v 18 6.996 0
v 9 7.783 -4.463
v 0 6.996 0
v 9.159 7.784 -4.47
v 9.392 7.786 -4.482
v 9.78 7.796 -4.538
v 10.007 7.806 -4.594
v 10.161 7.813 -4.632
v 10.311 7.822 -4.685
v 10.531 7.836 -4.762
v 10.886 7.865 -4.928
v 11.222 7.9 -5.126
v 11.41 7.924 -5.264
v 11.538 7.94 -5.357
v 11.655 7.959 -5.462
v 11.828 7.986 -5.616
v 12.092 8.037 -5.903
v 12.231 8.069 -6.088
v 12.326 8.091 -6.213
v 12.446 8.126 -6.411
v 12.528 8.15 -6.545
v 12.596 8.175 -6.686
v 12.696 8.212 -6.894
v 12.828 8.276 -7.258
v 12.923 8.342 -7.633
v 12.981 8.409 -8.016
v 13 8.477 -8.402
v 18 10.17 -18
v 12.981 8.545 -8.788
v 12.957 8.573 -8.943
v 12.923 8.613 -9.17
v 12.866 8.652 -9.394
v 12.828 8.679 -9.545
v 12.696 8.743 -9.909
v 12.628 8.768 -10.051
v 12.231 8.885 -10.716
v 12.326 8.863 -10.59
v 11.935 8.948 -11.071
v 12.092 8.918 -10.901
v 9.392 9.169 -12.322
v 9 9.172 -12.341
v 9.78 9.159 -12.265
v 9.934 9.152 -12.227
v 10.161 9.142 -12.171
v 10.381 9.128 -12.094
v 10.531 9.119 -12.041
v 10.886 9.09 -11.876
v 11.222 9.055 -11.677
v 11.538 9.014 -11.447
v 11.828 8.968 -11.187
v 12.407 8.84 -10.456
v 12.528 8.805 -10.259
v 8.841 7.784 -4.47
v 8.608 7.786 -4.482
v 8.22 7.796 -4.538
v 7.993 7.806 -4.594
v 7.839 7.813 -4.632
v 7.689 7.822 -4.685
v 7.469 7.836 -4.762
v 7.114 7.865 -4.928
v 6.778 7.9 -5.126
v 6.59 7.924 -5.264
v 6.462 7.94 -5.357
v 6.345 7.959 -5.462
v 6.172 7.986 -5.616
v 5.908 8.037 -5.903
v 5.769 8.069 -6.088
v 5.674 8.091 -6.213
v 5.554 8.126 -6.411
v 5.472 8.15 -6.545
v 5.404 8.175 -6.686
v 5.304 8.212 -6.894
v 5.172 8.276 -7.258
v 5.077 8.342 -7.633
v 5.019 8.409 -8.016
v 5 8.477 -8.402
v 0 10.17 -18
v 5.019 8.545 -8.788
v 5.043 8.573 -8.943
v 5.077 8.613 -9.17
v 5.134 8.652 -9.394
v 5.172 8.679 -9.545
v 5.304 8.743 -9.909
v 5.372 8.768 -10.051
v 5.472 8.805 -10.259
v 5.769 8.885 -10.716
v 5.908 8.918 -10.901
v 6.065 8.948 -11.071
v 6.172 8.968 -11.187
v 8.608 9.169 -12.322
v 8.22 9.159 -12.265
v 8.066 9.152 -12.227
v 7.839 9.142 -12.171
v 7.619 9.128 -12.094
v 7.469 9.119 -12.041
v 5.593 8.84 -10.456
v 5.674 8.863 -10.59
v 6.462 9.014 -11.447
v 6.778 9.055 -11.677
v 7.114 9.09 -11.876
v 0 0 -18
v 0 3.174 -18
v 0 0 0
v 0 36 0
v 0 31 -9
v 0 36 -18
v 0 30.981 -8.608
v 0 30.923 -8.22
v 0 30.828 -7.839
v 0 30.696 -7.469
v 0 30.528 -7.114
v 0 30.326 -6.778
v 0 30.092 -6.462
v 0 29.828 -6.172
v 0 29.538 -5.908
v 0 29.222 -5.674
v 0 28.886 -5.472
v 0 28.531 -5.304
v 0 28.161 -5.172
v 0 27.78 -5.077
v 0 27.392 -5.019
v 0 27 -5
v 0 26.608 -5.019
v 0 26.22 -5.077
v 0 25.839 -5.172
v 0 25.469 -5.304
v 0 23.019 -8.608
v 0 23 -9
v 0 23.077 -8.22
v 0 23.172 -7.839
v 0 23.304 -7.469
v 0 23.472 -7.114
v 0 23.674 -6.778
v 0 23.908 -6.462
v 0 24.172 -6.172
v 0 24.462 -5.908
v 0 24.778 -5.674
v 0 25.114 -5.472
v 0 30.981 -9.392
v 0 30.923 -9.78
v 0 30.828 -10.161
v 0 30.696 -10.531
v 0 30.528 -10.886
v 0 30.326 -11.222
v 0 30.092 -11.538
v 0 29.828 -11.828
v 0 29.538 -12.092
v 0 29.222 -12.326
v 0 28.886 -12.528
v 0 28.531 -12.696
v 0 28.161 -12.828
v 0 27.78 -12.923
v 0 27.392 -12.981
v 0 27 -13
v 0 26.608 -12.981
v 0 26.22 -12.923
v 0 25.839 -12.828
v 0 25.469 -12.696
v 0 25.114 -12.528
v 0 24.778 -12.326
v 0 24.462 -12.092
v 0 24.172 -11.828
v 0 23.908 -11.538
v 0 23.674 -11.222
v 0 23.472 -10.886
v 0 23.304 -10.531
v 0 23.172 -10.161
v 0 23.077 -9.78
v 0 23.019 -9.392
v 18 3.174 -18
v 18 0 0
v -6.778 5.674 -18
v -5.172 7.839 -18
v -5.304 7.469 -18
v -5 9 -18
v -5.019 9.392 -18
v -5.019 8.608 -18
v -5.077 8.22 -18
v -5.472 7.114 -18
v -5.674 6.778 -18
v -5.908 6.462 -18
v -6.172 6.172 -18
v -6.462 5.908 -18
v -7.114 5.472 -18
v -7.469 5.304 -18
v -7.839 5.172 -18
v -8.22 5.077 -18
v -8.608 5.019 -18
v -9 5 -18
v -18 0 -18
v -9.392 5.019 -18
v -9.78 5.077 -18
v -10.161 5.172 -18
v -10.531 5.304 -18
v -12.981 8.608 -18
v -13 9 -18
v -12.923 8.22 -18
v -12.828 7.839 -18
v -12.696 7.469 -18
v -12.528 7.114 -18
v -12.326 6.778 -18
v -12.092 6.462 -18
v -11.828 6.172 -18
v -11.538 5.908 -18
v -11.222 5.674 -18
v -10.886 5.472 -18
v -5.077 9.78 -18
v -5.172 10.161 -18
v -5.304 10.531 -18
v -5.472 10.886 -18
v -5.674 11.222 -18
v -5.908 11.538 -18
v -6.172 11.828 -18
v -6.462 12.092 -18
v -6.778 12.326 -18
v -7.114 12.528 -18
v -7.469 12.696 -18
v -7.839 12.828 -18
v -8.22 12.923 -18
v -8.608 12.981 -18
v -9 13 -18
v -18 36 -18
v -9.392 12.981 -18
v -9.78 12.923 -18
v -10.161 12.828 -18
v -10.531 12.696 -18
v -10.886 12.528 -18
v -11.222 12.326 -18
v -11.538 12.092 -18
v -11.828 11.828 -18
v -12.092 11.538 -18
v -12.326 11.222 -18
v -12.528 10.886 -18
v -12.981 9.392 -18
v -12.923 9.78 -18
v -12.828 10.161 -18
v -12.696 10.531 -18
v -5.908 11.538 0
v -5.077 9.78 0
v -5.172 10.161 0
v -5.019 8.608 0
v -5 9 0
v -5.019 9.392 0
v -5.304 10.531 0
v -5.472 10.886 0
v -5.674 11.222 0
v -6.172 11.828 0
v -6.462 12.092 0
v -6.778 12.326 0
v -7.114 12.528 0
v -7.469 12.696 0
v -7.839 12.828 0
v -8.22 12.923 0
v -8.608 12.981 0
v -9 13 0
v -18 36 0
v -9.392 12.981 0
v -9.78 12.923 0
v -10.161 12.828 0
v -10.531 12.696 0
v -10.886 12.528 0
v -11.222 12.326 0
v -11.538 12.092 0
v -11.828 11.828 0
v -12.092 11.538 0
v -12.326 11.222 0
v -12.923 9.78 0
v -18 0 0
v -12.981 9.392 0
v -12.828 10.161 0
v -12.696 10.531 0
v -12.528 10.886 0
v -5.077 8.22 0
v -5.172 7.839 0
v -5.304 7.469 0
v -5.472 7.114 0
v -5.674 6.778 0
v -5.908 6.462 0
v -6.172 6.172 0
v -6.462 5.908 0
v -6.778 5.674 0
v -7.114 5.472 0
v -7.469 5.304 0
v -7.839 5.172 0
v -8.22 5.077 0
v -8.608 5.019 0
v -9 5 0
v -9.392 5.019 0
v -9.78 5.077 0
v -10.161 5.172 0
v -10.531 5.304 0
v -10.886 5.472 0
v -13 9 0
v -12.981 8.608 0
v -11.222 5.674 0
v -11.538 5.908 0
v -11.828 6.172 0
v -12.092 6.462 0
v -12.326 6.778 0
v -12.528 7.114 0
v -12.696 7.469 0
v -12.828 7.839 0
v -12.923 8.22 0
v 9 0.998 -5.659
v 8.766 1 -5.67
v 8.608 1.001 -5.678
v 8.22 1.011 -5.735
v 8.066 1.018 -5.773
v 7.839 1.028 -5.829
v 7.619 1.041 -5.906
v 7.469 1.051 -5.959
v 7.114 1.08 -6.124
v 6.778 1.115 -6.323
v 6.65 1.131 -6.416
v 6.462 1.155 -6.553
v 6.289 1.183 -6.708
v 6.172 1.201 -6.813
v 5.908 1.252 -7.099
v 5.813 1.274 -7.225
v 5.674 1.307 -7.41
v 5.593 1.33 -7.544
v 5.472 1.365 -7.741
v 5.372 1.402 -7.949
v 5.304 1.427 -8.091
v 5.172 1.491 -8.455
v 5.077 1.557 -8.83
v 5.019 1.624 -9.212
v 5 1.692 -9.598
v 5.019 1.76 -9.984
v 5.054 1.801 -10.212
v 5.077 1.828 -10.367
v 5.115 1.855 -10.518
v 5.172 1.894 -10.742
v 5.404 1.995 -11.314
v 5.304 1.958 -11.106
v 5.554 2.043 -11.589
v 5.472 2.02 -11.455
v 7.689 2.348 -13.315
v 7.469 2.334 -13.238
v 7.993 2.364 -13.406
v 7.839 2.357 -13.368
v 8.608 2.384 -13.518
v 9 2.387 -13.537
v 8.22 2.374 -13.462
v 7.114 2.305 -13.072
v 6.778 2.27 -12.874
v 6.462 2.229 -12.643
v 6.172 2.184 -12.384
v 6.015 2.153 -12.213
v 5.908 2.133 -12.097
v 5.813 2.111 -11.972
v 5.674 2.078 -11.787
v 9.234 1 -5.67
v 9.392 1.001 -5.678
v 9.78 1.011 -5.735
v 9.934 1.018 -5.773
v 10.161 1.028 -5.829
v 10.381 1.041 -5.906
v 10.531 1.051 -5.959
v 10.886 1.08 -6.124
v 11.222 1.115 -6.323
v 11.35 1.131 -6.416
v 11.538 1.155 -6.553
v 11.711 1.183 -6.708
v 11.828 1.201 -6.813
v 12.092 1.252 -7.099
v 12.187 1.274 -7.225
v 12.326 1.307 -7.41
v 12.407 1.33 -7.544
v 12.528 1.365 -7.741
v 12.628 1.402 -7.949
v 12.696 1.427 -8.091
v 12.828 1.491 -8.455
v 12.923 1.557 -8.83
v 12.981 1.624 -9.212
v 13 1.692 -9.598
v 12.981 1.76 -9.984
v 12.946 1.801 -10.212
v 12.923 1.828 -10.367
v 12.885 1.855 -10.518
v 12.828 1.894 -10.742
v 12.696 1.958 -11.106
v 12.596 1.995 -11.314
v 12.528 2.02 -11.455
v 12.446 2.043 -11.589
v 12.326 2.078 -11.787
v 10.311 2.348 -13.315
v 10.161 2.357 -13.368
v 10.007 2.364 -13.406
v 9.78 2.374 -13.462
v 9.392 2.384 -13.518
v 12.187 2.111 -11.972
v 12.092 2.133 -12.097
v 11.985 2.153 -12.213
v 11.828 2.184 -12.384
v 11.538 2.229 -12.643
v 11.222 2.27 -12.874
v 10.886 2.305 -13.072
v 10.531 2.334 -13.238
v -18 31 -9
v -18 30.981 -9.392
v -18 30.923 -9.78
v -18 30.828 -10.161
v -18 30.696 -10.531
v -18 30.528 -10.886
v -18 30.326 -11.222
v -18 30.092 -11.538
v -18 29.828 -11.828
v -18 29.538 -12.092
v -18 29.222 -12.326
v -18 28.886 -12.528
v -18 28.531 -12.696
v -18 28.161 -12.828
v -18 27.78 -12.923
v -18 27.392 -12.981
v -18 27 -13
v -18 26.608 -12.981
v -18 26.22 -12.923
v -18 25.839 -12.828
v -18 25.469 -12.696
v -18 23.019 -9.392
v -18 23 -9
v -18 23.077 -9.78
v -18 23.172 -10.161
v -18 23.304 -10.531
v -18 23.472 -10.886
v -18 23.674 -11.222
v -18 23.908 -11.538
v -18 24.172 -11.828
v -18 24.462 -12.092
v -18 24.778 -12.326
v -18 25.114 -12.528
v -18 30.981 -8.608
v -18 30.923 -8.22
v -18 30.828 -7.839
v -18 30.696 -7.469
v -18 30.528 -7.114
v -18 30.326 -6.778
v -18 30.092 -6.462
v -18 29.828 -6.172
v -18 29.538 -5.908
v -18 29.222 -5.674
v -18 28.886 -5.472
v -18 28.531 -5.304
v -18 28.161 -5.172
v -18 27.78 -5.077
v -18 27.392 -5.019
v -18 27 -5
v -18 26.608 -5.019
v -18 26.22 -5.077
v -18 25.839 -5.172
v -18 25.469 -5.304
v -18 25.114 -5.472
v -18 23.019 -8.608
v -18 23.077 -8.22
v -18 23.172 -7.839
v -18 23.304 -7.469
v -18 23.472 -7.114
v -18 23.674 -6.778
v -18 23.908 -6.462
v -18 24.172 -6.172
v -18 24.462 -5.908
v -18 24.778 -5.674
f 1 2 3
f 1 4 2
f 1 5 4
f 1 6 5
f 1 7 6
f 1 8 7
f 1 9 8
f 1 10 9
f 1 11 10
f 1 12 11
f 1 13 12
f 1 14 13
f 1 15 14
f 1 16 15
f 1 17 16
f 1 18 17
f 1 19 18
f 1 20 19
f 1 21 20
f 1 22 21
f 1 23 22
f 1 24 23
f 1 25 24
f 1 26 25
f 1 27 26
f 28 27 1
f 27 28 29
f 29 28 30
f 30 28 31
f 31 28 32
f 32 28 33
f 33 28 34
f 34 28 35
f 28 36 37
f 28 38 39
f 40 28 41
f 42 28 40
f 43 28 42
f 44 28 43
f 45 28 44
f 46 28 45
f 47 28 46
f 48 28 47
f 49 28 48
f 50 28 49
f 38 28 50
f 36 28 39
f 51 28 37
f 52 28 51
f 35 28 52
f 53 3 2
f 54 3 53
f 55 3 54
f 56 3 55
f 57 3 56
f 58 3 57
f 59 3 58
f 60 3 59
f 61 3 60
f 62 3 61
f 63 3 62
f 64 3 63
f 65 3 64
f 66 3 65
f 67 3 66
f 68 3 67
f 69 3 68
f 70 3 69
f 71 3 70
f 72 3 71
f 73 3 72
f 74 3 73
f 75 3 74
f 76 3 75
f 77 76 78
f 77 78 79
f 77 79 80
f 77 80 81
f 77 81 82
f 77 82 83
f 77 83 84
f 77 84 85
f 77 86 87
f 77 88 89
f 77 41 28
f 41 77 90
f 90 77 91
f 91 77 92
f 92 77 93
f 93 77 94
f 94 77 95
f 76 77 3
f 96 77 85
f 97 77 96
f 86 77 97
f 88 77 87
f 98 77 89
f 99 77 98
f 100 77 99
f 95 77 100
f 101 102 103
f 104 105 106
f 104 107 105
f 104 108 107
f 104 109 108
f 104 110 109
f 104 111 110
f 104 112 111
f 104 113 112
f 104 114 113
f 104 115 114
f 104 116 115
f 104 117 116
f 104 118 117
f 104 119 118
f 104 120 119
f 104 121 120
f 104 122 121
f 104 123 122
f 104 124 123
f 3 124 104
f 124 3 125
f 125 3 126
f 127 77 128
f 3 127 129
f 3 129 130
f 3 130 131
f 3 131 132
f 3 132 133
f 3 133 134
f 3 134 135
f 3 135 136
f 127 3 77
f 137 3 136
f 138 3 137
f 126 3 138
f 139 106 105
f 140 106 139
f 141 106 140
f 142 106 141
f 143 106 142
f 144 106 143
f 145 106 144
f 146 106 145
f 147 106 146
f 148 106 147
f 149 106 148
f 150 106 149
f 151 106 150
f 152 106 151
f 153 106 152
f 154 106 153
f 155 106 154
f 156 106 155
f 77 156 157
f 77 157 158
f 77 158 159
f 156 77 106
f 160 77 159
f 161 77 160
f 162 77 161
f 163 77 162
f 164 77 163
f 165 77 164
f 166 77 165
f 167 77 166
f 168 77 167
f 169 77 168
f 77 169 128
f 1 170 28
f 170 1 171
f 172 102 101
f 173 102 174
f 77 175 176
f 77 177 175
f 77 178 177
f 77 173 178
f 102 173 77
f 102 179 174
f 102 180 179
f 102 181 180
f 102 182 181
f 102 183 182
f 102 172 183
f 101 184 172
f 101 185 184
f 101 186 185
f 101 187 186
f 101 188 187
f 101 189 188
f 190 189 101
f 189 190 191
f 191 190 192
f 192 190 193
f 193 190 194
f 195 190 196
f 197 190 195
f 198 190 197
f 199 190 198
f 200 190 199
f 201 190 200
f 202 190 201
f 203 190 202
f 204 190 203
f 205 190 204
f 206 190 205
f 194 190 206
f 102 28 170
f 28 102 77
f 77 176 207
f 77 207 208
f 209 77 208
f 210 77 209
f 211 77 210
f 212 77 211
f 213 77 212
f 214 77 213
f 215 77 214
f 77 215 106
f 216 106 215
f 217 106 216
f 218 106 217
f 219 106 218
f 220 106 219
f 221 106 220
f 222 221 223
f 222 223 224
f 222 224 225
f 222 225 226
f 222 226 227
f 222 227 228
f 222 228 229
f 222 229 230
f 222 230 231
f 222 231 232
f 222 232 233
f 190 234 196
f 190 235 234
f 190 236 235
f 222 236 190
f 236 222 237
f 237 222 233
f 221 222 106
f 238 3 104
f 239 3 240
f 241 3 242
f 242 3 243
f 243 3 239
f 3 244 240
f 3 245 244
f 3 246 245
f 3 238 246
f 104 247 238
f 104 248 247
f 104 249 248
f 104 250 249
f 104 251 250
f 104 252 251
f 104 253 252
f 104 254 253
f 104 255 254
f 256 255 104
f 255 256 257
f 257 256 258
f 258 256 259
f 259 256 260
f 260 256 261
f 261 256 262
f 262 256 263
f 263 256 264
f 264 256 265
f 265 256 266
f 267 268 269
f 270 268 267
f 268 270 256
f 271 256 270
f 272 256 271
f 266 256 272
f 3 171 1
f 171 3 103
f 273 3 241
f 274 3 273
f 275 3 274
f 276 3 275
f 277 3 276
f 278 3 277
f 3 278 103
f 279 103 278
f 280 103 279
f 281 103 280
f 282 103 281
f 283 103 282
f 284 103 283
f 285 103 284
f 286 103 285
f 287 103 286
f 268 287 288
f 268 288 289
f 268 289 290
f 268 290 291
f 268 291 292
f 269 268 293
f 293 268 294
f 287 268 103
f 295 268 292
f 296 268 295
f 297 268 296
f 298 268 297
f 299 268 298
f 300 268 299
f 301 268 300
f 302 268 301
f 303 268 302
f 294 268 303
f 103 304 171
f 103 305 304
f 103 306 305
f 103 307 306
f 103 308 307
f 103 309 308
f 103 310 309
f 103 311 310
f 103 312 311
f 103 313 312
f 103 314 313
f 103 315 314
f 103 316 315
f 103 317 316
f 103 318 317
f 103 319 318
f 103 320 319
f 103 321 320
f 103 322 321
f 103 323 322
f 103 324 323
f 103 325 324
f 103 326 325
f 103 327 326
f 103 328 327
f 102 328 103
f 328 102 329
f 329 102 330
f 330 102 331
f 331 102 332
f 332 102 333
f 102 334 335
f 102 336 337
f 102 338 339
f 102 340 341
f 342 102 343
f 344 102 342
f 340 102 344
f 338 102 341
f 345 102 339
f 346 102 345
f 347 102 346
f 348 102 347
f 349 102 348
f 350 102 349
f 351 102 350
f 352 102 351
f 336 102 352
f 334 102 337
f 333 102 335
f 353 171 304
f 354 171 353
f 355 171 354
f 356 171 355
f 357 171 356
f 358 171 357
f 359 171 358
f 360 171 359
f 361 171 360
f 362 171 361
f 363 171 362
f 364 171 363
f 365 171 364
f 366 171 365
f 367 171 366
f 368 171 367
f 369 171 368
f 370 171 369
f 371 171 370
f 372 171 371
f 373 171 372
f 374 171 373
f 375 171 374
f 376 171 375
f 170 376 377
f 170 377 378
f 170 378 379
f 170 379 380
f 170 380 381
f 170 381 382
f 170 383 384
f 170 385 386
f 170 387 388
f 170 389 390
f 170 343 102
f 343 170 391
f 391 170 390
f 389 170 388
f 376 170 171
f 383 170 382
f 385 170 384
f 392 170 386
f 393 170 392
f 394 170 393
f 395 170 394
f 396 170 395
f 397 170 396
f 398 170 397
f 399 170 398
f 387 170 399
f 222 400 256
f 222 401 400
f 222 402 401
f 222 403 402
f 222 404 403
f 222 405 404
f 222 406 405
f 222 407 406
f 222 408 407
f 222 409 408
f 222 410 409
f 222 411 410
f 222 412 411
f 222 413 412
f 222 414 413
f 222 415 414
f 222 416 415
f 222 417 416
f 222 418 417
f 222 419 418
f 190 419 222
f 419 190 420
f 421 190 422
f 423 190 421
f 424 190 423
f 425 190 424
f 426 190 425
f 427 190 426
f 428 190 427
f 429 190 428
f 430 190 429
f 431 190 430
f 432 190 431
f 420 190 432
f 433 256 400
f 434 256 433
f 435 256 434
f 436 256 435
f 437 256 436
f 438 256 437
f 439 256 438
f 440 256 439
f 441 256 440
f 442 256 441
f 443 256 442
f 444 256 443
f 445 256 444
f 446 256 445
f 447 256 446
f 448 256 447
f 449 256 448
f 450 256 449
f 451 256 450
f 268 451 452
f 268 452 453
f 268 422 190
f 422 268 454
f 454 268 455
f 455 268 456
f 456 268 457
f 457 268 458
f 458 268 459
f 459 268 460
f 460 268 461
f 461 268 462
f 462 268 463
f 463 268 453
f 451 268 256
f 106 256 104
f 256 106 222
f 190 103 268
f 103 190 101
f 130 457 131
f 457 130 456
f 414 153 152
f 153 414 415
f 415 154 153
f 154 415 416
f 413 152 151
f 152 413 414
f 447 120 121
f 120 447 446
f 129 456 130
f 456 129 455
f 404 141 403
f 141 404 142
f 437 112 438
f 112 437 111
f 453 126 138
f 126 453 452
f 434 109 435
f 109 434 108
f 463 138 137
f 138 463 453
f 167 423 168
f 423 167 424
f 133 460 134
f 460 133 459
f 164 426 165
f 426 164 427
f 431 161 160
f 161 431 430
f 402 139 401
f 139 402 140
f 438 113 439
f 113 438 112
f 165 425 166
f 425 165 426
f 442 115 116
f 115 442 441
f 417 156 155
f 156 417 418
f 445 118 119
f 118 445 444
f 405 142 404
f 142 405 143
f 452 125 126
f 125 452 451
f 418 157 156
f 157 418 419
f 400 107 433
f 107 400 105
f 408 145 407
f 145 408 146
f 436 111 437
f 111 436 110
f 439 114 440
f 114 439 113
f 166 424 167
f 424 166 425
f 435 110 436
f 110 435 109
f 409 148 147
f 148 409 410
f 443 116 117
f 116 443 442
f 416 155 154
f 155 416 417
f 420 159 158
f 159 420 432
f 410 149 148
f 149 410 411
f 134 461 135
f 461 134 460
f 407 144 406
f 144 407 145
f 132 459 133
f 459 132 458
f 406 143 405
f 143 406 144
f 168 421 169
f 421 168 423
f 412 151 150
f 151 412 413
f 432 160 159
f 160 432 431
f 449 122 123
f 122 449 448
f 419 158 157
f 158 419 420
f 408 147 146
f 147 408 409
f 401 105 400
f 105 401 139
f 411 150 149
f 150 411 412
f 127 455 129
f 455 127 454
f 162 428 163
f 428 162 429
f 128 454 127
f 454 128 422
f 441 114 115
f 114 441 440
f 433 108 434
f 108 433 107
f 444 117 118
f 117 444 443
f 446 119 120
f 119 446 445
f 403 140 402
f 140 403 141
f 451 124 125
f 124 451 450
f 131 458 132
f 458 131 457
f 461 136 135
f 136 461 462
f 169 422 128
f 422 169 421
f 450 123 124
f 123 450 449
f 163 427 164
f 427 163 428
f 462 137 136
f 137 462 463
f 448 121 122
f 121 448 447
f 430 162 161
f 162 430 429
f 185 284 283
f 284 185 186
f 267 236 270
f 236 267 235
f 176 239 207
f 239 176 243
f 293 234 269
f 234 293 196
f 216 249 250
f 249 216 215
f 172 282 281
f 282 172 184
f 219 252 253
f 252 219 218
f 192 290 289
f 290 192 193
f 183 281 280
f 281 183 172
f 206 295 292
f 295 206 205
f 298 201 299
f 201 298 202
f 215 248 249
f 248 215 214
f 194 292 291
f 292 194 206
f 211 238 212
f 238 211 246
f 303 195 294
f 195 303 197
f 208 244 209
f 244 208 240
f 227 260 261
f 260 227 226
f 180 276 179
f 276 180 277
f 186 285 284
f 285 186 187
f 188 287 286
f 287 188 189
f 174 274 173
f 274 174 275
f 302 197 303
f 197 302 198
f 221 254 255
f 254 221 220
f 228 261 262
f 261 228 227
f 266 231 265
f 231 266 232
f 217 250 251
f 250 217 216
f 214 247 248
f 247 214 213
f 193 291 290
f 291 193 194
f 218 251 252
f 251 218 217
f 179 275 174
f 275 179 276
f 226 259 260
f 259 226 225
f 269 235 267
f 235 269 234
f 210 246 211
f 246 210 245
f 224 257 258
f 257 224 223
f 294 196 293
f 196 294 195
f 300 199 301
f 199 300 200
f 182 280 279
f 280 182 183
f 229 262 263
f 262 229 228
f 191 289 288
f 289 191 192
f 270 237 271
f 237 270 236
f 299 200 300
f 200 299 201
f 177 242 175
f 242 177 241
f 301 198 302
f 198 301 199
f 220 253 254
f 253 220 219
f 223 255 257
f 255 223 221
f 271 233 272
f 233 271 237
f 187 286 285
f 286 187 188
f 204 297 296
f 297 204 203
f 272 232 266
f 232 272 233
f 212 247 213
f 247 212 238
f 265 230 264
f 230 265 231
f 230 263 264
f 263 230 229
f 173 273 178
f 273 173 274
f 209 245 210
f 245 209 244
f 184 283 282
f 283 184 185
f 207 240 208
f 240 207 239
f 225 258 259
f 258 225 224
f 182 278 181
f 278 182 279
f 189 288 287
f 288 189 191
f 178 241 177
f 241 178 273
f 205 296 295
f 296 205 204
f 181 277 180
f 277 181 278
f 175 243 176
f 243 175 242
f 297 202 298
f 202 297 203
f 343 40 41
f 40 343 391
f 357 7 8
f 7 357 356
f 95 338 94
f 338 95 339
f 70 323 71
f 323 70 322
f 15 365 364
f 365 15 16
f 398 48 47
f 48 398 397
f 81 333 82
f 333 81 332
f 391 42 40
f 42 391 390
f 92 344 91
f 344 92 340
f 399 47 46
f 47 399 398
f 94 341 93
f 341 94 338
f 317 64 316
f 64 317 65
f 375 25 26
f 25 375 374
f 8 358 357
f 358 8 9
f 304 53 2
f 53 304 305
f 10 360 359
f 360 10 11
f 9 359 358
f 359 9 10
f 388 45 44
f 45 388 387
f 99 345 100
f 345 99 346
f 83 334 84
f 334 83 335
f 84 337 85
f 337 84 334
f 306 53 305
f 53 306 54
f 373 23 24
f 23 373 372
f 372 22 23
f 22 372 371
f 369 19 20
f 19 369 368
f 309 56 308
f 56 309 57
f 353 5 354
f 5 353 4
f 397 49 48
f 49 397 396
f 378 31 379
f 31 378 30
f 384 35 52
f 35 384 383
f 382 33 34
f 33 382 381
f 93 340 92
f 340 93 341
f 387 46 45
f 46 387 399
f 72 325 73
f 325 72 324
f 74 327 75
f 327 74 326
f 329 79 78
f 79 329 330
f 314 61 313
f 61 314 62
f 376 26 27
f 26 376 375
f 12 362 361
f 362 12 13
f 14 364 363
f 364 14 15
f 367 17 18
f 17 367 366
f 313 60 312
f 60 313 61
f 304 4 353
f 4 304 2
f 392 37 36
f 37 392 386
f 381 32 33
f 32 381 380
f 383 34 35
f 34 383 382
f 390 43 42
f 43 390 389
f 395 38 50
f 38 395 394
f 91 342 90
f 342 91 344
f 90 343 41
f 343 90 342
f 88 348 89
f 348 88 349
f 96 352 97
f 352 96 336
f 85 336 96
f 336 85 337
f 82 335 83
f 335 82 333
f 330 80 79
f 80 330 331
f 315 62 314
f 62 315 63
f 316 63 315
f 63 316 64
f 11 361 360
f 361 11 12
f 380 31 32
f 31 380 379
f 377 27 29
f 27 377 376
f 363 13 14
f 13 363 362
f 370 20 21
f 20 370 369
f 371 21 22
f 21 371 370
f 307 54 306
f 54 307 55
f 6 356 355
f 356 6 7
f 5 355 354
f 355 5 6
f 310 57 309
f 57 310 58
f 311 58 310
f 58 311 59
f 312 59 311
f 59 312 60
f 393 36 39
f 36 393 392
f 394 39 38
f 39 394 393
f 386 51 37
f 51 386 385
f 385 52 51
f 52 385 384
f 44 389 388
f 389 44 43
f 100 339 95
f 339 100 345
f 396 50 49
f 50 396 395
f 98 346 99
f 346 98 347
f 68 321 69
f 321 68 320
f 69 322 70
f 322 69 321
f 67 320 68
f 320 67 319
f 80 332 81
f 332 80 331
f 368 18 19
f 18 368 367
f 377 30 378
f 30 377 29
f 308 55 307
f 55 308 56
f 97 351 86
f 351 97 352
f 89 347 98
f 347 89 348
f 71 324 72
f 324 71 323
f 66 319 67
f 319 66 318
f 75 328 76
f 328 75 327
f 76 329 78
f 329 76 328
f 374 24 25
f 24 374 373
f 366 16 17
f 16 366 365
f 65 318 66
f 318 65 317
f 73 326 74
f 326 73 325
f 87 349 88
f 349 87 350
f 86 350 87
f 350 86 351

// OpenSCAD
$fn= $preview ? 32 : 64;
part = "bottom_corner"; // [bottom_corner, bottom_corner_mirrored,top_corner,mounting_block,rail_mount,top_hook,all]
nut_width_with_margin=18;
nut_height_with_margin=8;
rod_diameter=8;
angle_of_inclanation=10;
h=nut_height_with_margin;
w=nut_width_with_margin;
d=rod_diameter;
mounting_hole=5;
width=150.0;
length=400;
a=angle_of_inclanation;

module bottom_corner(){
    difference(){
        union(){
            linear_extrude(w)polygon([[0,w-w*sin(a)-h*cos(a)],[0,0],[w,w*tan(a)],[w,w*tan(a)+w-w*sin(a)-h*cos(a)]]);
            translate([0,0,-w])cube([w,2*w,w]);
    }
    translate([w/2,1.5*w,-w-1])cylinder(h=w+2,d=d);
    translate([-1,w/2,-w/2])rotate([0,90,0])cylinder(h=w+2,d=d);
    translate([w/2,(w*tan(a)+w-w*sin(a)-h*cos(a))/2,w/2])rotate([90,0,a])cylinder(h=2*w,d=d,center=true);
    *mirror([0,0,1])cube([h,w,w]);
}
}
    Ax=h*sin(a);
    Ay=w;
    Dy=0;
    Dx=(h+w/cos(a))*sin(a);
    Bx=Ax+w*cos(a);
    By=Ay+w*sin(a);
    Cx=Dx+w*cos(a);
    Cy=Dy+w*sin(a);
    dw=(Cx+Ax)/2;
Hy=By+h*cos(a);
dh1=2*w-(w*tan(a)+w-w*sin(a)-h*cos(a))/2;
dh2=Hy-By/2;
h0=((width-2*h-w)/2-dw)/tan(a);
height=h0+dh1+dh2;
td=(w-w*sin(a)-h*cos(a))*cos(a);
rl=2*h+h0/cos(a)+0.5*w/cos(a)+td/2;
dist=(sqrt((Cx+Ax)*(Cx+Ax)+(By-w)*(By-w)))/2;
echo(dist);
module top_corner(){
     difference(){
    linear_extrude(w)polygon([[Ax,Ay],[Bx,By],[Cx,Cy],[Dx,Dy],[-Dx,Dy],[-Cx,Cy],[-Bx,By],[-Ax,Ay]]);
    translate([0,w/2,-1])cylinder(h=w+2, d=d);
    translate([(Ax+Cx)/2,(Ay+Cy)/2,w/2])rotate([90,0,a])cylinder(h=w/cos(a)+2, d=d,center=true);    
    translate([(-Ax-Cx)/2,(Ay+Cy)/2,w/2])rotate([90,0,-a])cylinder(h=w/cos(a)+2, d=d,center=true);
    translate([(Cx+Bx)/2,(Cy+By)/2,w/2])rotate([-a,90,0])cylinder(h=w,d=mounting_hole,center=true);
     }
}
module top_hook(){
     difference(){
    linear_extrude(w)polygon([[Ax,Ay],[Bx,By],[Cx,Cy],[Dx,Dy],[-Dx,Dy],[-nut_width_with_margin/2,Dy],[-nut_width_with_margin/2,Ay],[-Ax,Ay]]);
    hull(){
    translate([0,w/2,-1])cylinder(h=w+2, d=d);
    translate([0,0,-1])cylinder(h=w+2, d=d);
    }
    translate([(Ax+Cx)/2,(Ay+Cy)/2,w/2])rotate([90,0,a])cylinder(h=w/cos(a)+2, d=d,center=true);    
    *translate([(-Ax-Cx)/2,(Ay+Cy)/2,w/2])rotate([90,0,-a])cylinder(h=w/cos(a)+2, d=d,center=true);
    translate([(Cx+Bx)/2,(Cy+By)/2,w/2])rotate([-a,90,0])cylinder(h=w,d=mounting_hole,center=true);
     }
}
module mounting_block()
{
    difference()
    {
        cube([w,w,w]);
        translate([w/2,w/2,w/2])cylinder(h=w+2,d=d,center=true);
         translate([0,w/2,w/2])rotate([0,90,0])cylinder(h=w+1,d=mounting_hole,center=true);
    }
    }
module rail_mount()
    {
       rotate([90,0,0]) difference(){
       rotate([0,0,180/8])cylinder(d=w/cos(180/8),h=w+dist,$fn=8);
       translate([0,0,dist+w/2])rotate([90,0,45]) cylinder(d=d,h=w+2,center=true);
       translate([0,0,0.5*w])rotate([90,0,-45]) cylinder(d=d,h=w+2,center=true);
           cylinder(h=w,d=mounting_hole,center=true);
            }
        }
if (part=="bottom_corner") {
    rotate([0,90,0])bottom_corner();
}
if (part=="bottom_corner_mirrored") {
    mirror([1,0,0])rotate([0,-90,0])bottom_corner();
}
if (part=="top_corner") {
    top_corner();
}
if (part=="mounting_block") {
    mounting_block();
}
if (part=="rail_mount") {
    rail_mount();
}
if (part=="top_hook") {
    top_hook();
}
if (part=="all")
{
    mirror([0,1,1])bottom_corner();
    translate([width-2*h,0,0])mirror([1,0,0])mirror([0,1,1])bottom_corner();
    translate([0,length,0])mirror([0,1,0])mirror([0,1,1])bottom_corner();
    translate([width-2*h,length,0])mirror([0,1,0])mirror([1,0,0])mirror([0,1,1])bottom_corner();
    translate([width/2-h,0,h0-By/2-(w*tan(a)+w-w*sin(a)-h*cos(a))/2])rotate([90,0,0])top_corner();
    translate([width/2-h,length+w,h0-By/2-(w*tan(a)+w-w*sin(a)-h*cos(a))/2])rotate([90,0,0])top_corner();
    color("blue")
    {
        translate([w/2,-h,-1.5*w])rotate([-90,0,0])cylinder(d=d,h=length+2*h);
        translate([width-2*h-w/2,-h,-1.5*w])rotate([-90,0,0])cylinder(d=d,h=length+2*h);
        translate([width/2-h,-h-w,w/2+h0-By/2-(w*tan(a)+w-w*sin(a)-h*cos(a))/2])rotate([-90,0,0])cylinder(d=d,h=length+2*w+2*h);
        translate([-h,w/2,-w/2])rotate([0,90,0])cylinder(d=d,h=width);
        translate([-h,length-w/2,-w/2])rotate([0,90,0])cylinder(d=d,h=width);
        translate([w/2,-w/2,-(w*tan(a)+w-w*sin(a)-h*cos(a))/2])rotate([0,a,0])translate([0,0,-h-0.5*td])cylinder(d=d,h=rl);
        
        translate([width-2*h,0,0])mirror([1,0,0])translate([w/2,-w/2,-(w*tan(a)+w-w*sin(a)-h*cos(a))/2])rotate([0,a,0])translate([0,0,-h-cos(a)*(w-w*sin(a)-h*cos(a))/2])cylinder(d=d,h=rl);
        
        translate([0,length,0])mirror([0,1,0])translate([w/2,-w/2,-(w*tan(a)+w-w*sin(a)-h*cos(a))/2])rotate([0,a,0])translate([0,0,-h-cos(a)*(w-w*sin(a)-h*cos(a))/2])cylinder(d=d,h=rl);
        
        translate([width-2*h,length,0])mirror([0,1,0])mirror([1,0,0])translate([w/2,-w/2,-(w*tan(a)+w-w*sin(a)-h*cos(a))/2])rotate([0,a,0])translate([0,0,-h-cos(a)*(w-w*sin(a)-h*cos(a))/2])cylinder(d=d,h=rl);

        }
    }

echo("-----------------------------");
echo(str("Machine height = ", height,"mm"));
echo(str("Rod length = ",rl,"mm"));
echo("-----------------------------");
